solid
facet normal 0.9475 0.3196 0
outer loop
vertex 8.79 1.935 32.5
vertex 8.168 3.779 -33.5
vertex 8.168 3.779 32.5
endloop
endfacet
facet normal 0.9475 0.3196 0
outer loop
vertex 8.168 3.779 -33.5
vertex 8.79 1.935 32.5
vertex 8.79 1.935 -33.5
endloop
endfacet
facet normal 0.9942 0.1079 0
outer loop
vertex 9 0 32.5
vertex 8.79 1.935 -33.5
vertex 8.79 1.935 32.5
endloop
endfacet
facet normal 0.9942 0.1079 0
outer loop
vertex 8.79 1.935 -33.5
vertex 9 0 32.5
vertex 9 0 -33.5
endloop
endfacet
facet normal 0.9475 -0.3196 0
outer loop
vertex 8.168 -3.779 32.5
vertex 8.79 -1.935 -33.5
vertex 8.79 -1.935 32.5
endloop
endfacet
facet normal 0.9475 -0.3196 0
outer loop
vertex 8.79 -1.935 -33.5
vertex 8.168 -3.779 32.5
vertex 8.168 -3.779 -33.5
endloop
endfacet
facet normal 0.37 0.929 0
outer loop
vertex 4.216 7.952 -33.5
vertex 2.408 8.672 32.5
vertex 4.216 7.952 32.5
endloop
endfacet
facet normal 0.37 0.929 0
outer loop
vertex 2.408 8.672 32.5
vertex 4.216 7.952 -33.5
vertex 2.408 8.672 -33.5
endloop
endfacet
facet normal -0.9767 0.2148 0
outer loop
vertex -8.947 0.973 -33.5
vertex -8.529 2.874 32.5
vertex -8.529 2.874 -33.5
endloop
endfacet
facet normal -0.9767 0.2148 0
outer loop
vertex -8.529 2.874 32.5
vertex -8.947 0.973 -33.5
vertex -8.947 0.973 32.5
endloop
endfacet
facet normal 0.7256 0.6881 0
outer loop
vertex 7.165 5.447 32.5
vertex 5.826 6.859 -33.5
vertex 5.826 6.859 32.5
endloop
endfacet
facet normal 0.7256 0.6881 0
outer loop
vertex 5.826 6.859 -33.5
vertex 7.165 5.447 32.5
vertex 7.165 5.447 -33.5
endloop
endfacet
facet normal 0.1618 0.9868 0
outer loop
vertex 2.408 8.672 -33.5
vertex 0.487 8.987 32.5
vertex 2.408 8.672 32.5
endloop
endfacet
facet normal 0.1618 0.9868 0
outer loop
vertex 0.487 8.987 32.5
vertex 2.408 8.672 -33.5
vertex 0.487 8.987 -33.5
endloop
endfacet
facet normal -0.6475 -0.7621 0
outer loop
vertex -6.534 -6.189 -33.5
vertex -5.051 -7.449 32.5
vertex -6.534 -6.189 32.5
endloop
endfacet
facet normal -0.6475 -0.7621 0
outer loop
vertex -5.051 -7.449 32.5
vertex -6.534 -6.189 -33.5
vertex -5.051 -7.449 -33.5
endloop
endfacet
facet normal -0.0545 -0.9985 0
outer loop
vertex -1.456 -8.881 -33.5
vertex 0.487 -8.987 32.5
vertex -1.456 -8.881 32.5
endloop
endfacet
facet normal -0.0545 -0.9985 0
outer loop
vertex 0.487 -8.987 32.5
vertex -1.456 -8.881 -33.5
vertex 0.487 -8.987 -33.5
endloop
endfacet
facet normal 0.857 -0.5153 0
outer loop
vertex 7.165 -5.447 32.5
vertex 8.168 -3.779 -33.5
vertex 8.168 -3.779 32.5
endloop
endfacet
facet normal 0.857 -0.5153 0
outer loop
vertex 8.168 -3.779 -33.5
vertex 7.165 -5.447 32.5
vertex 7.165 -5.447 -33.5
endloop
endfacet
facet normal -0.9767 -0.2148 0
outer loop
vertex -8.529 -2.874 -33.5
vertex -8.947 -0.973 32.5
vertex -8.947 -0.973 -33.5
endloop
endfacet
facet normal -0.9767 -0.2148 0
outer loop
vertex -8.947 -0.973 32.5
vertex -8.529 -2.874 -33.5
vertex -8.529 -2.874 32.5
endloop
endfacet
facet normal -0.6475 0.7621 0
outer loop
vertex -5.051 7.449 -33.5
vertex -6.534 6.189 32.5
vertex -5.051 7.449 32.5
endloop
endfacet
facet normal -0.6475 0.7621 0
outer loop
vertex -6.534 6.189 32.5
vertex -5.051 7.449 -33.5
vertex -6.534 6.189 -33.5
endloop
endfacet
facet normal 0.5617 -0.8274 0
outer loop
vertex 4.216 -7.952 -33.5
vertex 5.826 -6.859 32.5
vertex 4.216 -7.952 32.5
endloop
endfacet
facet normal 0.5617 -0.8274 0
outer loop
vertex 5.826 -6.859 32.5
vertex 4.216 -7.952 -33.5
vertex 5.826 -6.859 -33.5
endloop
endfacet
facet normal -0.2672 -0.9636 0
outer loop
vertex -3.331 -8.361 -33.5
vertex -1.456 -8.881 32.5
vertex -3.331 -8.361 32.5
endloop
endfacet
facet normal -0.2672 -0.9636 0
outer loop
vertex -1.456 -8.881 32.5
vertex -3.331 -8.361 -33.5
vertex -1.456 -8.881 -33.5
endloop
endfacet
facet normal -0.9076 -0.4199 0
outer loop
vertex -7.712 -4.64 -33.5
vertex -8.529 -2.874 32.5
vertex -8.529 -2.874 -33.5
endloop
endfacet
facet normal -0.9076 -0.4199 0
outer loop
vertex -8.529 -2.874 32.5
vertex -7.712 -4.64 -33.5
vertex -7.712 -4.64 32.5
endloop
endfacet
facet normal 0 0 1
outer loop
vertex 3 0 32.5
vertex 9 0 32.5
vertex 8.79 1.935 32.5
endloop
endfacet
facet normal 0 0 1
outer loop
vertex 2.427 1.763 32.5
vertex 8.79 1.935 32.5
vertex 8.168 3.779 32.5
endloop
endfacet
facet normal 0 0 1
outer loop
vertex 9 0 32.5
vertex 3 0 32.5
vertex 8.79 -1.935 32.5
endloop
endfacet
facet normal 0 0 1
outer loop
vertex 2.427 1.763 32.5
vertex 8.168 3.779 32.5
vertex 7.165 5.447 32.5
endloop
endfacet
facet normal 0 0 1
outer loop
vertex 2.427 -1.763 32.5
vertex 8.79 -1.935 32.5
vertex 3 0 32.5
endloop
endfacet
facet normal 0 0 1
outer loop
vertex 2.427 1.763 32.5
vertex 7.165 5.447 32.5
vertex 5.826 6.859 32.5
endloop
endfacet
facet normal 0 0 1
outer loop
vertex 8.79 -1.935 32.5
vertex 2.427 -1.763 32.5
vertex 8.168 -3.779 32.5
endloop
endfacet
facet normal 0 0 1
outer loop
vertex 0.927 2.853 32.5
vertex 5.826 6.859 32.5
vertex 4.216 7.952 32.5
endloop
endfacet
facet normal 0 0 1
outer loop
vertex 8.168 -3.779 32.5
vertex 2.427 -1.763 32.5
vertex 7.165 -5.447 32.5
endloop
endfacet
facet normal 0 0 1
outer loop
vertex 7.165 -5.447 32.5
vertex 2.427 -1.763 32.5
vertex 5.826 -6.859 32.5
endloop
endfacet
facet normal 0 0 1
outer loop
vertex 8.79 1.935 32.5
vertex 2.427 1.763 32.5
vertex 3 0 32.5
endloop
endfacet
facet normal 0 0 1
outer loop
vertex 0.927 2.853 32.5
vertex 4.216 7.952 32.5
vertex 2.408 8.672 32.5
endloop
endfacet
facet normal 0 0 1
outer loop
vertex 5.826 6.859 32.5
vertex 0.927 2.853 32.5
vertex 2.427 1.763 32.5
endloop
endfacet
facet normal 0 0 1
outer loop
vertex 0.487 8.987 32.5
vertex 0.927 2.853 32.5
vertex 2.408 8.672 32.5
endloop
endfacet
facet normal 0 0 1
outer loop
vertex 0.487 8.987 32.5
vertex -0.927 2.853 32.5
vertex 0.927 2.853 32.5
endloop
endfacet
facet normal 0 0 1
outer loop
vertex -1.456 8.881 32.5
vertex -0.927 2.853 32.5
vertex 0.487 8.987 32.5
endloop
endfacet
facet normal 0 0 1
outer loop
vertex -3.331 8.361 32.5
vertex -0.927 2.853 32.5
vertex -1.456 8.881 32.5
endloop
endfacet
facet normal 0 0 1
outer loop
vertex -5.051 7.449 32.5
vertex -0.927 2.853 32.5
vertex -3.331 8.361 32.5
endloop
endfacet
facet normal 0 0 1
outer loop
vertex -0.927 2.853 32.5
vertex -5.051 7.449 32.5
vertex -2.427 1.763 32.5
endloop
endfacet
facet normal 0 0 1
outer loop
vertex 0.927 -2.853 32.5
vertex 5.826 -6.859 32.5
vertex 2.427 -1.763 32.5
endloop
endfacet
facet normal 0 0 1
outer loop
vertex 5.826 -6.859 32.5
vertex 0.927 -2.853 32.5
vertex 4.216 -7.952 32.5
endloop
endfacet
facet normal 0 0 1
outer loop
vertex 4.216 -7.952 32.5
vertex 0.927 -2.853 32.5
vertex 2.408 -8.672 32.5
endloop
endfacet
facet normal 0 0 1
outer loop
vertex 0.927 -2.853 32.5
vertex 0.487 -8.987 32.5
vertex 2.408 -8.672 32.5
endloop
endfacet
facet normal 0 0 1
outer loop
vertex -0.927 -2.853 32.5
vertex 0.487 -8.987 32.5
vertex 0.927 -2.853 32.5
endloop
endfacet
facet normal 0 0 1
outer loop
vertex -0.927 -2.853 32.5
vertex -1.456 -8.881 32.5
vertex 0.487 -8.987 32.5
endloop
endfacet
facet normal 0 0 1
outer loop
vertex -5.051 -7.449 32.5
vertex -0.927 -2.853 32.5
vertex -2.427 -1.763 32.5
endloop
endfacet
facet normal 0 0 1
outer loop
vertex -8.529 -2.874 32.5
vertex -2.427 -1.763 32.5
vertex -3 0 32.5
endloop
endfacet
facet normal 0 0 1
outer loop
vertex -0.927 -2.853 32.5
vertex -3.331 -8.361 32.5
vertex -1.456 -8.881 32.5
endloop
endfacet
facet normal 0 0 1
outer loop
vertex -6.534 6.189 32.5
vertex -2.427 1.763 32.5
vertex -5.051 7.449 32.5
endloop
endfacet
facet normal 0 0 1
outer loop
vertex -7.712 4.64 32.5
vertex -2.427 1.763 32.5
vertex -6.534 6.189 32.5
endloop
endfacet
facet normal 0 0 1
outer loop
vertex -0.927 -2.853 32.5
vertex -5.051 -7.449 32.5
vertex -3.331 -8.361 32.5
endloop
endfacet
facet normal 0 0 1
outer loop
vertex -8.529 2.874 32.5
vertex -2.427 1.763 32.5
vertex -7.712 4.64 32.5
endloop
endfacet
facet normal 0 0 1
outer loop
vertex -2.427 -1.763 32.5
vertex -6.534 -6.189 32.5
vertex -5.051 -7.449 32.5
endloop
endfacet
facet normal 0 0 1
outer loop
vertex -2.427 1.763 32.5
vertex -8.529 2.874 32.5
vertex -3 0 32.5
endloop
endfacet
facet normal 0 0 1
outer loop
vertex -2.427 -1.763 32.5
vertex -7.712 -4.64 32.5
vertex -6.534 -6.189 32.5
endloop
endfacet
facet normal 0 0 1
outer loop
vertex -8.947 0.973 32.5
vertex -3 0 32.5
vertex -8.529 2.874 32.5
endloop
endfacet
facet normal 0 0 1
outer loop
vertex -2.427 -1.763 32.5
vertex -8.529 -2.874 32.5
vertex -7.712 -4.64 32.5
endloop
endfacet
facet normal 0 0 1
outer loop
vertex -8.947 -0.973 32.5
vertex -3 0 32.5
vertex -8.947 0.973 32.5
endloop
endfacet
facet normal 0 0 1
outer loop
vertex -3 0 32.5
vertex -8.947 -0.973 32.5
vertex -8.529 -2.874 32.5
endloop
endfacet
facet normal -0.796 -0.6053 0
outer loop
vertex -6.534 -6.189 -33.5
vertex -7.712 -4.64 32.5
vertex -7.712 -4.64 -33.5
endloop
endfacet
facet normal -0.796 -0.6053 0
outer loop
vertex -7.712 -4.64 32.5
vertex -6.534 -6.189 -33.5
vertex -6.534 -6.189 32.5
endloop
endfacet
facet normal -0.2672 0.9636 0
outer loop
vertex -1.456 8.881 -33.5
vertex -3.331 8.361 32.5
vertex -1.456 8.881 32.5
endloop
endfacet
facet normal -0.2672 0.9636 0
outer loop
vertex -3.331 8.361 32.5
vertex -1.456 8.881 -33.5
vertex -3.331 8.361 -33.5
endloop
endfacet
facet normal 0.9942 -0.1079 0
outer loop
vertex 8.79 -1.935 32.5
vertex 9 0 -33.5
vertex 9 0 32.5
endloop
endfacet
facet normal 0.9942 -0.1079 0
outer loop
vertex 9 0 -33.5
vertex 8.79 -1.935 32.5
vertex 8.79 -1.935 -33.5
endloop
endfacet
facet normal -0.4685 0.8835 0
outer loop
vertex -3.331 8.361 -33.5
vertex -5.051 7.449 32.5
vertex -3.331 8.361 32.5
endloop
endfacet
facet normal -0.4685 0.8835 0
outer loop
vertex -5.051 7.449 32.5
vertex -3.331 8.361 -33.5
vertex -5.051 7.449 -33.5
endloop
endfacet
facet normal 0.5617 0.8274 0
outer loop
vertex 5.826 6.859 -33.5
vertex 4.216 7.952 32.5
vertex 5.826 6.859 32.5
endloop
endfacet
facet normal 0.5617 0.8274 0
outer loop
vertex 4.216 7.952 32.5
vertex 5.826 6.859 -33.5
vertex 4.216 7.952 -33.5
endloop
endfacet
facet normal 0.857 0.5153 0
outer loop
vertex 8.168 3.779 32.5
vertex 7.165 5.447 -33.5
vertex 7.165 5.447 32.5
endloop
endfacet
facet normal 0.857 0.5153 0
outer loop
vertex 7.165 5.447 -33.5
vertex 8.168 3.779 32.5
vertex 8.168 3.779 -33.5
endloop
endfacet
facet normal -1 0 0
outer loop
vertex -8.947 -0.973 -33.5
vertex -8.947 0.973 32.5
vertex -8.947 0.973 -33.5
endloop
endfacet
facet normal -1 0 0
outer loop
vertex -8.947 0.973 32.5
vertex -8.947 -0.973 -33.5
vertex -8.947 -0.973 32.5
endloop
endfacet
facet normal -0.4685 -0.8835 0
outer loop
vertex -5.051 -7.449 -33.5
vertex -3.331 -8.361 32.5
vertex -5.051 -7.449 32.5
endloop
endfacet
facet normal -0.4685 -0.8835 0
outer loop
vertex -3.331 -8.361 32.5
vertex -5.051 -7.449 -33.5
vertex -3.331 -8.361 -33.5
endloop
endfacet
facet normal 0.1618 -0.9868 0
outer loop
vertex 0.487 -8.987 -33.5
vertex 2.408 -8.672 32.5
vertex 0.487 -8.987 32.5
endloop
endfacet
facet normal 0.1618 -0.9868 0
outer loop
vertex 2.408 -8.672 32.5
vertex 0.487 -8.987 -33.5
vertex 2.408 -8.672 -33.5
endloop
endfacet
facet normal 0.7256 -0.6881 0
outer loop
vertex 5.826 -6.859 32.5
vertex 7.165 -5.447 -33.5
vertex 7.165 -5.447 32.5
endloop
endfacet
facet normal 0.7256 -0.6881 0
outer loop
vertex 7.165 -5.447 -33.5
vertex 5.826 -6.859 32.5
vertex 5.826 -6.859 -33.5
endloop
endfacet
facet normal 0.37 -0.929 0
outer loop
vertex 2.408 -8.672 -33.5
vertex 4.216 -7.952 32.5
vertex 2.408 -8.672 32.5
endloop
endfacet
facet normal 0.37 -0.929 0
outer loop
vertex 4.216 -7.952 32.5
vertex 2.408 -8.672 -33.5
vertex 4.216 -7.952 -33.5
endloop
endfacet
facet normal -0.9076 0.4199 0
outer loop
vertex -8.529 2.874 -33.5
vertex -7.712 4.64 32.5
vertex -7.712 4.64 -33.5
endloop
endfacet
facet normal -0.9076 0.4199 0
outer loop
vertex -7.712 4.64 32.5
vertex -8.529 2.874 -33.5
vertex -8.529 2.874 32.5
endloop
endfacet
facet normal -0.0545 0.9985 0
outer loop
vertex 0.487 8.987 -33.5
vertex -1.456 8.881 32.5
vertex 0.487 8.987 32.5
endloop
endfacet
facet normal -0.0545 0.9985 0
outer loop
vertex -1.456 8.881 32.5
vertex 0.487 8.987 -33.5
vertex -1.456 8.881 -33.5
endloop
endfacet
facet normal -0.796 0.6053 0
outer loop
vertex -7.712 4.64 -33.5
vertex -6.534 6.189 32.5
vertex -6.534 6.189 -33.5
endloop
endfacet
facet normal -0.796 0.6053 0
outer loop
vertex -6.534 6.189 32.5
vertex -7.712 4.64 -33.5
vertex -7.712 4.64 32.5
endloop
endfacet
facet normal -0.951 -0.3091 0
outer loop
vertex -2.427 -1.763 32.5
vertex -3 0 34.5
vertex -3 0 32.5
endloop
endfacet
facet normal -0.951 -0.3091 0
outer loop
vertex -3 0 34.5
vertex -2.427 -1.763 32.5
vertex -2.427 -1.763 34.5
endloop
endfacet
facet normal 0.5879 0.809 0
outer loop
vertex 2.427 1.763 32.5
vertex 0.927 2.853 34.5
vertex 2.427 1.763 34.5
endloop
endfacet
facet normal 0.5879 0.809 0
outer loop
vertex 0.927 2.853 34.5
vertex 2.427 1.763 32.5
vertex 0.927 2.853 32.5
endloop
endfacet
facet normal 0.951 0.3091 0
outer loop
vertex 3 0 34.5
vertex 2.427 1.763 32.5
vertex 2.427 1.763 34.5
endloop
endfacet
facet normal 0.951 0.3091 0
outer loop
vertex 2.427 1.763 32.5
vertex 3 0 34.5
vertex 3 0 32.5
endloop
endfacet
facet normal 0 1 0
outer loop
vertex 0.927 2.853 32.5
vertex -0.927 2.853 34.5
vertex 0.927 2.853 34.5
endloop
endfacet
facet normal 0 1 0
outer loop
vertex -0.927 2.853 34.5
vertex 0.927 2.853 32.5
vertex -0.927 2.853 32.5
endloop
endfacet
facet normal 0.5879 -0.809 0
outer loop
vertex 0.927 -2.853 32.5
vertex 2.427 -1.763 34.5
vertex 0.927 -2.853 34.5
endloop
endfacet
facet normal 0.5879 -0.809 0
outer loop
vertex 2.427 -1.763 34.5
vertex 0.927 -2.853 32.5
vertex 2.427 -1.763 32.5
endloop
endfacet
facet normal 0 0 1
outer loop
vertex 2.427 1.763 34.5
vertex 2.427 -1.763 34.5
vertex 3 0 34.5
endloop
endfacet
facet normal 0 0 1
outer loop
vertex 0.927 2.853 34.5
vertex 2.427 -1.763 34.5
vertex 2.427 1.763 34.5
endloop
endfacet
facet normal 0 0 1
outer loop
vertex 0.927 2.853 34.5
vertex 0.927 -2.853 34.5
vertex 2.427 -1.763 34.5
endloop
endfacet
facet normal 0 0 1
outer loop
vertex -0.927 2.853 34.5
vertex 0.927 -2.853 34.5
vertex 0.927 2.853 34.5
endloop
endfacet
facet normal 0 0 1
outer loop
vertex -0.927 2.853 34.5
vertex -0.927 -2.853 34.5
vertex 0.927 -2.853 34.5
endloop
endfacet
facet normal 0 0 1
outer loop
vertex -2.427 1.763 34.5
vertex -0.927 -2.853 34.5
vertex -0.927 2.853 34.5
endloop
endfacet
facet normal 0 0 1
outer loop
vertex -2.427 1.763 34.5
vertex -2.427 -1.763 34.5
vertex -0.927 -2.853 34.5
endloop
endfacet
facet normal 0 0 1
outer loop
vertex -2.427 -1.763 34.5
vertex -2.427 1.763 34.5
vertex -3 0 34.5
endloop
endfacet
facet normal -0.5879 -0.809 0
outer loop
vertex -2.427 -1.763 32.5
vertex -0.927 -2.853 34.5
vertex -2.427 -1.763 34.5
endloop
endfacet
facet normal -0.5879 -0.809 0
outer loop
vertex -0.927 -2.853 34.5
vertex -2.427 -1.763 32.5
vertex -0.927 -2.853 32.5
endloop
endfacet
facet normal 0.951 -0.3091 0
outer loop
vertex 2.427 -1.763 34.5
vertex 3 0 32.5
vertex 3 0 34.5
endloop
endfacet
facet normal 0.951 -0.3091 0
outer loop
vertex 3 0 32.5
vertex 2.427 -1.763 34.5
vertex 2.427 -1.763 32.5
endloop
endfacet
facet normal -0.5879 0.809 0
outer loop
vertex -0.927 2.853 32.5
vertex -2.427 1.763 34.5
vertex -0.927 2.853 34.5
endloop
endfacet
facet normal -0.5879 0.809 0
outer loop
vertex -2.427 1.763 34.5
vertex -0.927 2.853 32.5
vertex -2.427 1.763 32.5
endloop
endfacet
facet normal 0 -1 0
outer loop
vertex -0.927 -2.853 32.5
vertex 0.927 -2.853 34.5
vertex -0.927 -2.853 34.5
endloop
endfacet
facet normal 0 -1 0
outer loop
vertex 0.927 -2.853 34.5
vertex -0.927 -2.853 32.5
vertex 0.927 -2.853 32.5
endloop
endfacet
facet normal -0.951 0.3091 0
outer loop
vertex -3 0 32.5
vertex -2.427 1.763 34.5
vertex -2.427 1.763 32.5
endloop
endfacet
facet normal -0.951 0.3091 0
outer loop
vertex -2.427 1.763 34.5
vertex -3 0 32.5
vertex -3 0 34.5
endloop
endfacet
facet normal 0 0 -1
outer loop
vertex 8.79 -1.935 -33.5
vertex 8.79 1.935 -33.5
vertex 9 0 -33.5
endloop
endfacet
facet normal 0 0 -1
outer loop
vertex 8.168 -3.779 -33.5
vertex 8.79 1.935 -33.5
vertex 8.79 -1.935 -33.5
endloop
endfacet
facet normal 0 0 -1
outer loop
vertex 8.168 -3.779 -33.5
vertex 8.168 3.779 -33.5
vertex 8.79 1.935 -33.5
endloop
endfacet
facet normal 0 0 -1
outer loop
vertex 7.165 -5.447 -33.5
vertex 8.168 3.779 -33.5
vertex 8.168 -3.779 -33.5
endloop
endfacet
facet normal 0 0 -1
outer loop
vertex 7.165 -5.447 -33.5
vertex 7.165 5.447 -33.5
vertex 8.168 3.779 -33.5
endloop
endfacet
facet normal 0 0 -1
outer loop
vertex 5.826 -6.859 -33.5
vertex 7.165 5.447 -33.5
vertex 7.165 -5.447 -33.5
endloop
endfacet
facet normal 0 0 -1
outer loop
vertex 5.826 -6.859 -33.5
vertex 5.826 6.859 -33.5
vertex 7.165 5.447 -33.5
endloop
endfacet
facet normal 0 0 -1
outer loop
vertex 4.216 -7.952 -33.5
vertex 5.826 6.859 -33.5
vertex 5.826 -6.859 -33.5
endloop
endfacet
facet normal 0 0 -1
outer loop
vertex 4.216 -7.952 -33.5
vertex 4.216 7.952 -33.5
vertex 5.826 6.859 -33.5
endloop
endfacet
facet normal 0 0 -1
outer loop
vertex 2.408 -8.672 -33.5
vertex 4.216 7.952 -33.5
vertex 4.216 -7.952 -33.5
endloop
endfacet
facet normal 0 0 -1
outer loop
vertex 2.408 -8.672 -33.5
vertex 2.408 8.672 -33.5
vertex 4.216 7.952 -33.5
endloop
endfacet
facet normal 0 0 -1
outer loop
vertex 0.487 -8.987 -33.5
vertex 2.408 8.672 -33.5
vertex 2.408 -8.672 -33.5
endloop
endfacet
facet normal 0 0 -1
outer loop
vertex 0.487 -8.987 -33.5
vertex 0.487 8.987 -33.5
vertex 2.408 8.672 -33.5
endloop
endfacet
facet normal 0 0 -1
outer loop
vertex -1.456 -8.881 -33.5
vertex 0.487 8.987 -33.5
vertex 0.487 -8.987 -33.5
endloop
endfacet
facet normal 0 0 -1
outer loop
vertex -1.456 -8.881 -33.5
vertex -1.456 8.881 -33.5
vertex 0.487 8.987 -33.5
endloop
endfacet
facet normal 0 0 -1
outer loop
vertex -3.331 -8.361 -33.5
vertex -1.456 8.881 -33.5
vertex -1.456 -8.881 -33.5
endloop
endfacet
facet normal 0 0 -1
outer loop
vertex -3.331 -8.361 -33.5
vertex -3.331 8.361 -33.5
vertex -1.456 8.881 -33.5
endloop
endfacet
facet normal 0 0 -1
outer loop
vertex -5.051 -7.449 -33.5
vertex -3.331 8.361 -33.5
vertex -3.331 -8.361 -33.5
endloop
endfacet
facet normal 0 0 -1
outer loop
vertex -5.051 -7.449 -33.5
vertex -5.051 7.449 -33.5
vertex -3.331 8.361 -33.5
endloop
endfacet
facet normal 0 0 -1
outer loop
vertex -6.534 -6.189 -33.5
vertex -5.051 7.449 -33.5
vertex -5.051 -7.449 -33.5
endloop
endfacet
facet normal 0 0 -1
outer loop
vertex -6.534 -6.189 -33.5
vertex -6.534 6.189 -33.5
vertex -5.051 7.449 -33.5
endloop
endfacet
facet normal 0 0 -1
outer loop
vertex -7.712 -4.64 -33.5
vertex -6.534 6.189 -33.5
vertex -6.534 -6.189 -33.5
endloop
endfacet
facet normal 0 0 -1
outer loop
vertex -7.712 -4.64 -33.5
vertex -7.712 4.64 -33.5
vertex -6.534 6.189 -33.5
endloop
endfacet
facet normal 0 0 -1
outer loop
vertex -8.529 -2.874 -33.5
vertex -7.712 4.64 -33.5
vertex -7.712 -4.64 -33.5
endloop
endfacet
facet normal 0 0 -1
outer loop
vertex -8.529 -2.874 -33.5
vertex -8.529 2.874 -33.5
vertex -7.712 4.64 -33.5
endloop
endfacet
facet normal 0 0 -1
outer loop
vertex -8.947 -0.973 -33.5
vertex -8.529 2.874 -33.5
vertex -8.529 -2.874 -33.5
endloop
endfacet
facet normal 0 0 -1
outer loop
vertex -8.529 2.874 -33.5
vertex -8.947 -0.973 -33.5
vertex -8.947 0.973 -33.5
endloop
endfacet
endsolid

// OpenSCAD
// Parameters for the battery cell
battery_diameter = 18; // Diameter of the battery
battery_height = 65;   // Overall height of the battery

// Parameters for the positive terminal
positive_terminal_diameter = 6; // Diameter of the positive terminal button
positive_terminal_height = 2;   // Height of the positive terminal button

// Parameters for the negative terminal
negative_terminal_diameter = battery_diameter; // Diameter of the negative terminal flat contact
negative_terminal_height = 1; // Height of the negative terminal flat contact

// Main battery cell body
module cylindrical_cell_body() {
    cylinder(h = battery_height, d = battery_diameter, center = true);
}

// Positive terminal button
module positive_terminal_button() {
    translate([0, 0, battery_height / 2])
        cylinder(h = positive_terminal_height, d = positive_terminal_diameter, center = false);
}

// Negative terminal flat contact
module negative_terminal_flat_contact() {
    translate([0, 0, -battery_height / 2 - negative_terminal_height])
        cylinder(h = negative_terminal_height, d = negative_terminal_diameter, center = false);
}

// Complete battery model
module battery() {
    cylindrical_cell_body();
    positive_terminal_button();
    negative_terminal_flat_contact();
}

// Render the battery
battery();
